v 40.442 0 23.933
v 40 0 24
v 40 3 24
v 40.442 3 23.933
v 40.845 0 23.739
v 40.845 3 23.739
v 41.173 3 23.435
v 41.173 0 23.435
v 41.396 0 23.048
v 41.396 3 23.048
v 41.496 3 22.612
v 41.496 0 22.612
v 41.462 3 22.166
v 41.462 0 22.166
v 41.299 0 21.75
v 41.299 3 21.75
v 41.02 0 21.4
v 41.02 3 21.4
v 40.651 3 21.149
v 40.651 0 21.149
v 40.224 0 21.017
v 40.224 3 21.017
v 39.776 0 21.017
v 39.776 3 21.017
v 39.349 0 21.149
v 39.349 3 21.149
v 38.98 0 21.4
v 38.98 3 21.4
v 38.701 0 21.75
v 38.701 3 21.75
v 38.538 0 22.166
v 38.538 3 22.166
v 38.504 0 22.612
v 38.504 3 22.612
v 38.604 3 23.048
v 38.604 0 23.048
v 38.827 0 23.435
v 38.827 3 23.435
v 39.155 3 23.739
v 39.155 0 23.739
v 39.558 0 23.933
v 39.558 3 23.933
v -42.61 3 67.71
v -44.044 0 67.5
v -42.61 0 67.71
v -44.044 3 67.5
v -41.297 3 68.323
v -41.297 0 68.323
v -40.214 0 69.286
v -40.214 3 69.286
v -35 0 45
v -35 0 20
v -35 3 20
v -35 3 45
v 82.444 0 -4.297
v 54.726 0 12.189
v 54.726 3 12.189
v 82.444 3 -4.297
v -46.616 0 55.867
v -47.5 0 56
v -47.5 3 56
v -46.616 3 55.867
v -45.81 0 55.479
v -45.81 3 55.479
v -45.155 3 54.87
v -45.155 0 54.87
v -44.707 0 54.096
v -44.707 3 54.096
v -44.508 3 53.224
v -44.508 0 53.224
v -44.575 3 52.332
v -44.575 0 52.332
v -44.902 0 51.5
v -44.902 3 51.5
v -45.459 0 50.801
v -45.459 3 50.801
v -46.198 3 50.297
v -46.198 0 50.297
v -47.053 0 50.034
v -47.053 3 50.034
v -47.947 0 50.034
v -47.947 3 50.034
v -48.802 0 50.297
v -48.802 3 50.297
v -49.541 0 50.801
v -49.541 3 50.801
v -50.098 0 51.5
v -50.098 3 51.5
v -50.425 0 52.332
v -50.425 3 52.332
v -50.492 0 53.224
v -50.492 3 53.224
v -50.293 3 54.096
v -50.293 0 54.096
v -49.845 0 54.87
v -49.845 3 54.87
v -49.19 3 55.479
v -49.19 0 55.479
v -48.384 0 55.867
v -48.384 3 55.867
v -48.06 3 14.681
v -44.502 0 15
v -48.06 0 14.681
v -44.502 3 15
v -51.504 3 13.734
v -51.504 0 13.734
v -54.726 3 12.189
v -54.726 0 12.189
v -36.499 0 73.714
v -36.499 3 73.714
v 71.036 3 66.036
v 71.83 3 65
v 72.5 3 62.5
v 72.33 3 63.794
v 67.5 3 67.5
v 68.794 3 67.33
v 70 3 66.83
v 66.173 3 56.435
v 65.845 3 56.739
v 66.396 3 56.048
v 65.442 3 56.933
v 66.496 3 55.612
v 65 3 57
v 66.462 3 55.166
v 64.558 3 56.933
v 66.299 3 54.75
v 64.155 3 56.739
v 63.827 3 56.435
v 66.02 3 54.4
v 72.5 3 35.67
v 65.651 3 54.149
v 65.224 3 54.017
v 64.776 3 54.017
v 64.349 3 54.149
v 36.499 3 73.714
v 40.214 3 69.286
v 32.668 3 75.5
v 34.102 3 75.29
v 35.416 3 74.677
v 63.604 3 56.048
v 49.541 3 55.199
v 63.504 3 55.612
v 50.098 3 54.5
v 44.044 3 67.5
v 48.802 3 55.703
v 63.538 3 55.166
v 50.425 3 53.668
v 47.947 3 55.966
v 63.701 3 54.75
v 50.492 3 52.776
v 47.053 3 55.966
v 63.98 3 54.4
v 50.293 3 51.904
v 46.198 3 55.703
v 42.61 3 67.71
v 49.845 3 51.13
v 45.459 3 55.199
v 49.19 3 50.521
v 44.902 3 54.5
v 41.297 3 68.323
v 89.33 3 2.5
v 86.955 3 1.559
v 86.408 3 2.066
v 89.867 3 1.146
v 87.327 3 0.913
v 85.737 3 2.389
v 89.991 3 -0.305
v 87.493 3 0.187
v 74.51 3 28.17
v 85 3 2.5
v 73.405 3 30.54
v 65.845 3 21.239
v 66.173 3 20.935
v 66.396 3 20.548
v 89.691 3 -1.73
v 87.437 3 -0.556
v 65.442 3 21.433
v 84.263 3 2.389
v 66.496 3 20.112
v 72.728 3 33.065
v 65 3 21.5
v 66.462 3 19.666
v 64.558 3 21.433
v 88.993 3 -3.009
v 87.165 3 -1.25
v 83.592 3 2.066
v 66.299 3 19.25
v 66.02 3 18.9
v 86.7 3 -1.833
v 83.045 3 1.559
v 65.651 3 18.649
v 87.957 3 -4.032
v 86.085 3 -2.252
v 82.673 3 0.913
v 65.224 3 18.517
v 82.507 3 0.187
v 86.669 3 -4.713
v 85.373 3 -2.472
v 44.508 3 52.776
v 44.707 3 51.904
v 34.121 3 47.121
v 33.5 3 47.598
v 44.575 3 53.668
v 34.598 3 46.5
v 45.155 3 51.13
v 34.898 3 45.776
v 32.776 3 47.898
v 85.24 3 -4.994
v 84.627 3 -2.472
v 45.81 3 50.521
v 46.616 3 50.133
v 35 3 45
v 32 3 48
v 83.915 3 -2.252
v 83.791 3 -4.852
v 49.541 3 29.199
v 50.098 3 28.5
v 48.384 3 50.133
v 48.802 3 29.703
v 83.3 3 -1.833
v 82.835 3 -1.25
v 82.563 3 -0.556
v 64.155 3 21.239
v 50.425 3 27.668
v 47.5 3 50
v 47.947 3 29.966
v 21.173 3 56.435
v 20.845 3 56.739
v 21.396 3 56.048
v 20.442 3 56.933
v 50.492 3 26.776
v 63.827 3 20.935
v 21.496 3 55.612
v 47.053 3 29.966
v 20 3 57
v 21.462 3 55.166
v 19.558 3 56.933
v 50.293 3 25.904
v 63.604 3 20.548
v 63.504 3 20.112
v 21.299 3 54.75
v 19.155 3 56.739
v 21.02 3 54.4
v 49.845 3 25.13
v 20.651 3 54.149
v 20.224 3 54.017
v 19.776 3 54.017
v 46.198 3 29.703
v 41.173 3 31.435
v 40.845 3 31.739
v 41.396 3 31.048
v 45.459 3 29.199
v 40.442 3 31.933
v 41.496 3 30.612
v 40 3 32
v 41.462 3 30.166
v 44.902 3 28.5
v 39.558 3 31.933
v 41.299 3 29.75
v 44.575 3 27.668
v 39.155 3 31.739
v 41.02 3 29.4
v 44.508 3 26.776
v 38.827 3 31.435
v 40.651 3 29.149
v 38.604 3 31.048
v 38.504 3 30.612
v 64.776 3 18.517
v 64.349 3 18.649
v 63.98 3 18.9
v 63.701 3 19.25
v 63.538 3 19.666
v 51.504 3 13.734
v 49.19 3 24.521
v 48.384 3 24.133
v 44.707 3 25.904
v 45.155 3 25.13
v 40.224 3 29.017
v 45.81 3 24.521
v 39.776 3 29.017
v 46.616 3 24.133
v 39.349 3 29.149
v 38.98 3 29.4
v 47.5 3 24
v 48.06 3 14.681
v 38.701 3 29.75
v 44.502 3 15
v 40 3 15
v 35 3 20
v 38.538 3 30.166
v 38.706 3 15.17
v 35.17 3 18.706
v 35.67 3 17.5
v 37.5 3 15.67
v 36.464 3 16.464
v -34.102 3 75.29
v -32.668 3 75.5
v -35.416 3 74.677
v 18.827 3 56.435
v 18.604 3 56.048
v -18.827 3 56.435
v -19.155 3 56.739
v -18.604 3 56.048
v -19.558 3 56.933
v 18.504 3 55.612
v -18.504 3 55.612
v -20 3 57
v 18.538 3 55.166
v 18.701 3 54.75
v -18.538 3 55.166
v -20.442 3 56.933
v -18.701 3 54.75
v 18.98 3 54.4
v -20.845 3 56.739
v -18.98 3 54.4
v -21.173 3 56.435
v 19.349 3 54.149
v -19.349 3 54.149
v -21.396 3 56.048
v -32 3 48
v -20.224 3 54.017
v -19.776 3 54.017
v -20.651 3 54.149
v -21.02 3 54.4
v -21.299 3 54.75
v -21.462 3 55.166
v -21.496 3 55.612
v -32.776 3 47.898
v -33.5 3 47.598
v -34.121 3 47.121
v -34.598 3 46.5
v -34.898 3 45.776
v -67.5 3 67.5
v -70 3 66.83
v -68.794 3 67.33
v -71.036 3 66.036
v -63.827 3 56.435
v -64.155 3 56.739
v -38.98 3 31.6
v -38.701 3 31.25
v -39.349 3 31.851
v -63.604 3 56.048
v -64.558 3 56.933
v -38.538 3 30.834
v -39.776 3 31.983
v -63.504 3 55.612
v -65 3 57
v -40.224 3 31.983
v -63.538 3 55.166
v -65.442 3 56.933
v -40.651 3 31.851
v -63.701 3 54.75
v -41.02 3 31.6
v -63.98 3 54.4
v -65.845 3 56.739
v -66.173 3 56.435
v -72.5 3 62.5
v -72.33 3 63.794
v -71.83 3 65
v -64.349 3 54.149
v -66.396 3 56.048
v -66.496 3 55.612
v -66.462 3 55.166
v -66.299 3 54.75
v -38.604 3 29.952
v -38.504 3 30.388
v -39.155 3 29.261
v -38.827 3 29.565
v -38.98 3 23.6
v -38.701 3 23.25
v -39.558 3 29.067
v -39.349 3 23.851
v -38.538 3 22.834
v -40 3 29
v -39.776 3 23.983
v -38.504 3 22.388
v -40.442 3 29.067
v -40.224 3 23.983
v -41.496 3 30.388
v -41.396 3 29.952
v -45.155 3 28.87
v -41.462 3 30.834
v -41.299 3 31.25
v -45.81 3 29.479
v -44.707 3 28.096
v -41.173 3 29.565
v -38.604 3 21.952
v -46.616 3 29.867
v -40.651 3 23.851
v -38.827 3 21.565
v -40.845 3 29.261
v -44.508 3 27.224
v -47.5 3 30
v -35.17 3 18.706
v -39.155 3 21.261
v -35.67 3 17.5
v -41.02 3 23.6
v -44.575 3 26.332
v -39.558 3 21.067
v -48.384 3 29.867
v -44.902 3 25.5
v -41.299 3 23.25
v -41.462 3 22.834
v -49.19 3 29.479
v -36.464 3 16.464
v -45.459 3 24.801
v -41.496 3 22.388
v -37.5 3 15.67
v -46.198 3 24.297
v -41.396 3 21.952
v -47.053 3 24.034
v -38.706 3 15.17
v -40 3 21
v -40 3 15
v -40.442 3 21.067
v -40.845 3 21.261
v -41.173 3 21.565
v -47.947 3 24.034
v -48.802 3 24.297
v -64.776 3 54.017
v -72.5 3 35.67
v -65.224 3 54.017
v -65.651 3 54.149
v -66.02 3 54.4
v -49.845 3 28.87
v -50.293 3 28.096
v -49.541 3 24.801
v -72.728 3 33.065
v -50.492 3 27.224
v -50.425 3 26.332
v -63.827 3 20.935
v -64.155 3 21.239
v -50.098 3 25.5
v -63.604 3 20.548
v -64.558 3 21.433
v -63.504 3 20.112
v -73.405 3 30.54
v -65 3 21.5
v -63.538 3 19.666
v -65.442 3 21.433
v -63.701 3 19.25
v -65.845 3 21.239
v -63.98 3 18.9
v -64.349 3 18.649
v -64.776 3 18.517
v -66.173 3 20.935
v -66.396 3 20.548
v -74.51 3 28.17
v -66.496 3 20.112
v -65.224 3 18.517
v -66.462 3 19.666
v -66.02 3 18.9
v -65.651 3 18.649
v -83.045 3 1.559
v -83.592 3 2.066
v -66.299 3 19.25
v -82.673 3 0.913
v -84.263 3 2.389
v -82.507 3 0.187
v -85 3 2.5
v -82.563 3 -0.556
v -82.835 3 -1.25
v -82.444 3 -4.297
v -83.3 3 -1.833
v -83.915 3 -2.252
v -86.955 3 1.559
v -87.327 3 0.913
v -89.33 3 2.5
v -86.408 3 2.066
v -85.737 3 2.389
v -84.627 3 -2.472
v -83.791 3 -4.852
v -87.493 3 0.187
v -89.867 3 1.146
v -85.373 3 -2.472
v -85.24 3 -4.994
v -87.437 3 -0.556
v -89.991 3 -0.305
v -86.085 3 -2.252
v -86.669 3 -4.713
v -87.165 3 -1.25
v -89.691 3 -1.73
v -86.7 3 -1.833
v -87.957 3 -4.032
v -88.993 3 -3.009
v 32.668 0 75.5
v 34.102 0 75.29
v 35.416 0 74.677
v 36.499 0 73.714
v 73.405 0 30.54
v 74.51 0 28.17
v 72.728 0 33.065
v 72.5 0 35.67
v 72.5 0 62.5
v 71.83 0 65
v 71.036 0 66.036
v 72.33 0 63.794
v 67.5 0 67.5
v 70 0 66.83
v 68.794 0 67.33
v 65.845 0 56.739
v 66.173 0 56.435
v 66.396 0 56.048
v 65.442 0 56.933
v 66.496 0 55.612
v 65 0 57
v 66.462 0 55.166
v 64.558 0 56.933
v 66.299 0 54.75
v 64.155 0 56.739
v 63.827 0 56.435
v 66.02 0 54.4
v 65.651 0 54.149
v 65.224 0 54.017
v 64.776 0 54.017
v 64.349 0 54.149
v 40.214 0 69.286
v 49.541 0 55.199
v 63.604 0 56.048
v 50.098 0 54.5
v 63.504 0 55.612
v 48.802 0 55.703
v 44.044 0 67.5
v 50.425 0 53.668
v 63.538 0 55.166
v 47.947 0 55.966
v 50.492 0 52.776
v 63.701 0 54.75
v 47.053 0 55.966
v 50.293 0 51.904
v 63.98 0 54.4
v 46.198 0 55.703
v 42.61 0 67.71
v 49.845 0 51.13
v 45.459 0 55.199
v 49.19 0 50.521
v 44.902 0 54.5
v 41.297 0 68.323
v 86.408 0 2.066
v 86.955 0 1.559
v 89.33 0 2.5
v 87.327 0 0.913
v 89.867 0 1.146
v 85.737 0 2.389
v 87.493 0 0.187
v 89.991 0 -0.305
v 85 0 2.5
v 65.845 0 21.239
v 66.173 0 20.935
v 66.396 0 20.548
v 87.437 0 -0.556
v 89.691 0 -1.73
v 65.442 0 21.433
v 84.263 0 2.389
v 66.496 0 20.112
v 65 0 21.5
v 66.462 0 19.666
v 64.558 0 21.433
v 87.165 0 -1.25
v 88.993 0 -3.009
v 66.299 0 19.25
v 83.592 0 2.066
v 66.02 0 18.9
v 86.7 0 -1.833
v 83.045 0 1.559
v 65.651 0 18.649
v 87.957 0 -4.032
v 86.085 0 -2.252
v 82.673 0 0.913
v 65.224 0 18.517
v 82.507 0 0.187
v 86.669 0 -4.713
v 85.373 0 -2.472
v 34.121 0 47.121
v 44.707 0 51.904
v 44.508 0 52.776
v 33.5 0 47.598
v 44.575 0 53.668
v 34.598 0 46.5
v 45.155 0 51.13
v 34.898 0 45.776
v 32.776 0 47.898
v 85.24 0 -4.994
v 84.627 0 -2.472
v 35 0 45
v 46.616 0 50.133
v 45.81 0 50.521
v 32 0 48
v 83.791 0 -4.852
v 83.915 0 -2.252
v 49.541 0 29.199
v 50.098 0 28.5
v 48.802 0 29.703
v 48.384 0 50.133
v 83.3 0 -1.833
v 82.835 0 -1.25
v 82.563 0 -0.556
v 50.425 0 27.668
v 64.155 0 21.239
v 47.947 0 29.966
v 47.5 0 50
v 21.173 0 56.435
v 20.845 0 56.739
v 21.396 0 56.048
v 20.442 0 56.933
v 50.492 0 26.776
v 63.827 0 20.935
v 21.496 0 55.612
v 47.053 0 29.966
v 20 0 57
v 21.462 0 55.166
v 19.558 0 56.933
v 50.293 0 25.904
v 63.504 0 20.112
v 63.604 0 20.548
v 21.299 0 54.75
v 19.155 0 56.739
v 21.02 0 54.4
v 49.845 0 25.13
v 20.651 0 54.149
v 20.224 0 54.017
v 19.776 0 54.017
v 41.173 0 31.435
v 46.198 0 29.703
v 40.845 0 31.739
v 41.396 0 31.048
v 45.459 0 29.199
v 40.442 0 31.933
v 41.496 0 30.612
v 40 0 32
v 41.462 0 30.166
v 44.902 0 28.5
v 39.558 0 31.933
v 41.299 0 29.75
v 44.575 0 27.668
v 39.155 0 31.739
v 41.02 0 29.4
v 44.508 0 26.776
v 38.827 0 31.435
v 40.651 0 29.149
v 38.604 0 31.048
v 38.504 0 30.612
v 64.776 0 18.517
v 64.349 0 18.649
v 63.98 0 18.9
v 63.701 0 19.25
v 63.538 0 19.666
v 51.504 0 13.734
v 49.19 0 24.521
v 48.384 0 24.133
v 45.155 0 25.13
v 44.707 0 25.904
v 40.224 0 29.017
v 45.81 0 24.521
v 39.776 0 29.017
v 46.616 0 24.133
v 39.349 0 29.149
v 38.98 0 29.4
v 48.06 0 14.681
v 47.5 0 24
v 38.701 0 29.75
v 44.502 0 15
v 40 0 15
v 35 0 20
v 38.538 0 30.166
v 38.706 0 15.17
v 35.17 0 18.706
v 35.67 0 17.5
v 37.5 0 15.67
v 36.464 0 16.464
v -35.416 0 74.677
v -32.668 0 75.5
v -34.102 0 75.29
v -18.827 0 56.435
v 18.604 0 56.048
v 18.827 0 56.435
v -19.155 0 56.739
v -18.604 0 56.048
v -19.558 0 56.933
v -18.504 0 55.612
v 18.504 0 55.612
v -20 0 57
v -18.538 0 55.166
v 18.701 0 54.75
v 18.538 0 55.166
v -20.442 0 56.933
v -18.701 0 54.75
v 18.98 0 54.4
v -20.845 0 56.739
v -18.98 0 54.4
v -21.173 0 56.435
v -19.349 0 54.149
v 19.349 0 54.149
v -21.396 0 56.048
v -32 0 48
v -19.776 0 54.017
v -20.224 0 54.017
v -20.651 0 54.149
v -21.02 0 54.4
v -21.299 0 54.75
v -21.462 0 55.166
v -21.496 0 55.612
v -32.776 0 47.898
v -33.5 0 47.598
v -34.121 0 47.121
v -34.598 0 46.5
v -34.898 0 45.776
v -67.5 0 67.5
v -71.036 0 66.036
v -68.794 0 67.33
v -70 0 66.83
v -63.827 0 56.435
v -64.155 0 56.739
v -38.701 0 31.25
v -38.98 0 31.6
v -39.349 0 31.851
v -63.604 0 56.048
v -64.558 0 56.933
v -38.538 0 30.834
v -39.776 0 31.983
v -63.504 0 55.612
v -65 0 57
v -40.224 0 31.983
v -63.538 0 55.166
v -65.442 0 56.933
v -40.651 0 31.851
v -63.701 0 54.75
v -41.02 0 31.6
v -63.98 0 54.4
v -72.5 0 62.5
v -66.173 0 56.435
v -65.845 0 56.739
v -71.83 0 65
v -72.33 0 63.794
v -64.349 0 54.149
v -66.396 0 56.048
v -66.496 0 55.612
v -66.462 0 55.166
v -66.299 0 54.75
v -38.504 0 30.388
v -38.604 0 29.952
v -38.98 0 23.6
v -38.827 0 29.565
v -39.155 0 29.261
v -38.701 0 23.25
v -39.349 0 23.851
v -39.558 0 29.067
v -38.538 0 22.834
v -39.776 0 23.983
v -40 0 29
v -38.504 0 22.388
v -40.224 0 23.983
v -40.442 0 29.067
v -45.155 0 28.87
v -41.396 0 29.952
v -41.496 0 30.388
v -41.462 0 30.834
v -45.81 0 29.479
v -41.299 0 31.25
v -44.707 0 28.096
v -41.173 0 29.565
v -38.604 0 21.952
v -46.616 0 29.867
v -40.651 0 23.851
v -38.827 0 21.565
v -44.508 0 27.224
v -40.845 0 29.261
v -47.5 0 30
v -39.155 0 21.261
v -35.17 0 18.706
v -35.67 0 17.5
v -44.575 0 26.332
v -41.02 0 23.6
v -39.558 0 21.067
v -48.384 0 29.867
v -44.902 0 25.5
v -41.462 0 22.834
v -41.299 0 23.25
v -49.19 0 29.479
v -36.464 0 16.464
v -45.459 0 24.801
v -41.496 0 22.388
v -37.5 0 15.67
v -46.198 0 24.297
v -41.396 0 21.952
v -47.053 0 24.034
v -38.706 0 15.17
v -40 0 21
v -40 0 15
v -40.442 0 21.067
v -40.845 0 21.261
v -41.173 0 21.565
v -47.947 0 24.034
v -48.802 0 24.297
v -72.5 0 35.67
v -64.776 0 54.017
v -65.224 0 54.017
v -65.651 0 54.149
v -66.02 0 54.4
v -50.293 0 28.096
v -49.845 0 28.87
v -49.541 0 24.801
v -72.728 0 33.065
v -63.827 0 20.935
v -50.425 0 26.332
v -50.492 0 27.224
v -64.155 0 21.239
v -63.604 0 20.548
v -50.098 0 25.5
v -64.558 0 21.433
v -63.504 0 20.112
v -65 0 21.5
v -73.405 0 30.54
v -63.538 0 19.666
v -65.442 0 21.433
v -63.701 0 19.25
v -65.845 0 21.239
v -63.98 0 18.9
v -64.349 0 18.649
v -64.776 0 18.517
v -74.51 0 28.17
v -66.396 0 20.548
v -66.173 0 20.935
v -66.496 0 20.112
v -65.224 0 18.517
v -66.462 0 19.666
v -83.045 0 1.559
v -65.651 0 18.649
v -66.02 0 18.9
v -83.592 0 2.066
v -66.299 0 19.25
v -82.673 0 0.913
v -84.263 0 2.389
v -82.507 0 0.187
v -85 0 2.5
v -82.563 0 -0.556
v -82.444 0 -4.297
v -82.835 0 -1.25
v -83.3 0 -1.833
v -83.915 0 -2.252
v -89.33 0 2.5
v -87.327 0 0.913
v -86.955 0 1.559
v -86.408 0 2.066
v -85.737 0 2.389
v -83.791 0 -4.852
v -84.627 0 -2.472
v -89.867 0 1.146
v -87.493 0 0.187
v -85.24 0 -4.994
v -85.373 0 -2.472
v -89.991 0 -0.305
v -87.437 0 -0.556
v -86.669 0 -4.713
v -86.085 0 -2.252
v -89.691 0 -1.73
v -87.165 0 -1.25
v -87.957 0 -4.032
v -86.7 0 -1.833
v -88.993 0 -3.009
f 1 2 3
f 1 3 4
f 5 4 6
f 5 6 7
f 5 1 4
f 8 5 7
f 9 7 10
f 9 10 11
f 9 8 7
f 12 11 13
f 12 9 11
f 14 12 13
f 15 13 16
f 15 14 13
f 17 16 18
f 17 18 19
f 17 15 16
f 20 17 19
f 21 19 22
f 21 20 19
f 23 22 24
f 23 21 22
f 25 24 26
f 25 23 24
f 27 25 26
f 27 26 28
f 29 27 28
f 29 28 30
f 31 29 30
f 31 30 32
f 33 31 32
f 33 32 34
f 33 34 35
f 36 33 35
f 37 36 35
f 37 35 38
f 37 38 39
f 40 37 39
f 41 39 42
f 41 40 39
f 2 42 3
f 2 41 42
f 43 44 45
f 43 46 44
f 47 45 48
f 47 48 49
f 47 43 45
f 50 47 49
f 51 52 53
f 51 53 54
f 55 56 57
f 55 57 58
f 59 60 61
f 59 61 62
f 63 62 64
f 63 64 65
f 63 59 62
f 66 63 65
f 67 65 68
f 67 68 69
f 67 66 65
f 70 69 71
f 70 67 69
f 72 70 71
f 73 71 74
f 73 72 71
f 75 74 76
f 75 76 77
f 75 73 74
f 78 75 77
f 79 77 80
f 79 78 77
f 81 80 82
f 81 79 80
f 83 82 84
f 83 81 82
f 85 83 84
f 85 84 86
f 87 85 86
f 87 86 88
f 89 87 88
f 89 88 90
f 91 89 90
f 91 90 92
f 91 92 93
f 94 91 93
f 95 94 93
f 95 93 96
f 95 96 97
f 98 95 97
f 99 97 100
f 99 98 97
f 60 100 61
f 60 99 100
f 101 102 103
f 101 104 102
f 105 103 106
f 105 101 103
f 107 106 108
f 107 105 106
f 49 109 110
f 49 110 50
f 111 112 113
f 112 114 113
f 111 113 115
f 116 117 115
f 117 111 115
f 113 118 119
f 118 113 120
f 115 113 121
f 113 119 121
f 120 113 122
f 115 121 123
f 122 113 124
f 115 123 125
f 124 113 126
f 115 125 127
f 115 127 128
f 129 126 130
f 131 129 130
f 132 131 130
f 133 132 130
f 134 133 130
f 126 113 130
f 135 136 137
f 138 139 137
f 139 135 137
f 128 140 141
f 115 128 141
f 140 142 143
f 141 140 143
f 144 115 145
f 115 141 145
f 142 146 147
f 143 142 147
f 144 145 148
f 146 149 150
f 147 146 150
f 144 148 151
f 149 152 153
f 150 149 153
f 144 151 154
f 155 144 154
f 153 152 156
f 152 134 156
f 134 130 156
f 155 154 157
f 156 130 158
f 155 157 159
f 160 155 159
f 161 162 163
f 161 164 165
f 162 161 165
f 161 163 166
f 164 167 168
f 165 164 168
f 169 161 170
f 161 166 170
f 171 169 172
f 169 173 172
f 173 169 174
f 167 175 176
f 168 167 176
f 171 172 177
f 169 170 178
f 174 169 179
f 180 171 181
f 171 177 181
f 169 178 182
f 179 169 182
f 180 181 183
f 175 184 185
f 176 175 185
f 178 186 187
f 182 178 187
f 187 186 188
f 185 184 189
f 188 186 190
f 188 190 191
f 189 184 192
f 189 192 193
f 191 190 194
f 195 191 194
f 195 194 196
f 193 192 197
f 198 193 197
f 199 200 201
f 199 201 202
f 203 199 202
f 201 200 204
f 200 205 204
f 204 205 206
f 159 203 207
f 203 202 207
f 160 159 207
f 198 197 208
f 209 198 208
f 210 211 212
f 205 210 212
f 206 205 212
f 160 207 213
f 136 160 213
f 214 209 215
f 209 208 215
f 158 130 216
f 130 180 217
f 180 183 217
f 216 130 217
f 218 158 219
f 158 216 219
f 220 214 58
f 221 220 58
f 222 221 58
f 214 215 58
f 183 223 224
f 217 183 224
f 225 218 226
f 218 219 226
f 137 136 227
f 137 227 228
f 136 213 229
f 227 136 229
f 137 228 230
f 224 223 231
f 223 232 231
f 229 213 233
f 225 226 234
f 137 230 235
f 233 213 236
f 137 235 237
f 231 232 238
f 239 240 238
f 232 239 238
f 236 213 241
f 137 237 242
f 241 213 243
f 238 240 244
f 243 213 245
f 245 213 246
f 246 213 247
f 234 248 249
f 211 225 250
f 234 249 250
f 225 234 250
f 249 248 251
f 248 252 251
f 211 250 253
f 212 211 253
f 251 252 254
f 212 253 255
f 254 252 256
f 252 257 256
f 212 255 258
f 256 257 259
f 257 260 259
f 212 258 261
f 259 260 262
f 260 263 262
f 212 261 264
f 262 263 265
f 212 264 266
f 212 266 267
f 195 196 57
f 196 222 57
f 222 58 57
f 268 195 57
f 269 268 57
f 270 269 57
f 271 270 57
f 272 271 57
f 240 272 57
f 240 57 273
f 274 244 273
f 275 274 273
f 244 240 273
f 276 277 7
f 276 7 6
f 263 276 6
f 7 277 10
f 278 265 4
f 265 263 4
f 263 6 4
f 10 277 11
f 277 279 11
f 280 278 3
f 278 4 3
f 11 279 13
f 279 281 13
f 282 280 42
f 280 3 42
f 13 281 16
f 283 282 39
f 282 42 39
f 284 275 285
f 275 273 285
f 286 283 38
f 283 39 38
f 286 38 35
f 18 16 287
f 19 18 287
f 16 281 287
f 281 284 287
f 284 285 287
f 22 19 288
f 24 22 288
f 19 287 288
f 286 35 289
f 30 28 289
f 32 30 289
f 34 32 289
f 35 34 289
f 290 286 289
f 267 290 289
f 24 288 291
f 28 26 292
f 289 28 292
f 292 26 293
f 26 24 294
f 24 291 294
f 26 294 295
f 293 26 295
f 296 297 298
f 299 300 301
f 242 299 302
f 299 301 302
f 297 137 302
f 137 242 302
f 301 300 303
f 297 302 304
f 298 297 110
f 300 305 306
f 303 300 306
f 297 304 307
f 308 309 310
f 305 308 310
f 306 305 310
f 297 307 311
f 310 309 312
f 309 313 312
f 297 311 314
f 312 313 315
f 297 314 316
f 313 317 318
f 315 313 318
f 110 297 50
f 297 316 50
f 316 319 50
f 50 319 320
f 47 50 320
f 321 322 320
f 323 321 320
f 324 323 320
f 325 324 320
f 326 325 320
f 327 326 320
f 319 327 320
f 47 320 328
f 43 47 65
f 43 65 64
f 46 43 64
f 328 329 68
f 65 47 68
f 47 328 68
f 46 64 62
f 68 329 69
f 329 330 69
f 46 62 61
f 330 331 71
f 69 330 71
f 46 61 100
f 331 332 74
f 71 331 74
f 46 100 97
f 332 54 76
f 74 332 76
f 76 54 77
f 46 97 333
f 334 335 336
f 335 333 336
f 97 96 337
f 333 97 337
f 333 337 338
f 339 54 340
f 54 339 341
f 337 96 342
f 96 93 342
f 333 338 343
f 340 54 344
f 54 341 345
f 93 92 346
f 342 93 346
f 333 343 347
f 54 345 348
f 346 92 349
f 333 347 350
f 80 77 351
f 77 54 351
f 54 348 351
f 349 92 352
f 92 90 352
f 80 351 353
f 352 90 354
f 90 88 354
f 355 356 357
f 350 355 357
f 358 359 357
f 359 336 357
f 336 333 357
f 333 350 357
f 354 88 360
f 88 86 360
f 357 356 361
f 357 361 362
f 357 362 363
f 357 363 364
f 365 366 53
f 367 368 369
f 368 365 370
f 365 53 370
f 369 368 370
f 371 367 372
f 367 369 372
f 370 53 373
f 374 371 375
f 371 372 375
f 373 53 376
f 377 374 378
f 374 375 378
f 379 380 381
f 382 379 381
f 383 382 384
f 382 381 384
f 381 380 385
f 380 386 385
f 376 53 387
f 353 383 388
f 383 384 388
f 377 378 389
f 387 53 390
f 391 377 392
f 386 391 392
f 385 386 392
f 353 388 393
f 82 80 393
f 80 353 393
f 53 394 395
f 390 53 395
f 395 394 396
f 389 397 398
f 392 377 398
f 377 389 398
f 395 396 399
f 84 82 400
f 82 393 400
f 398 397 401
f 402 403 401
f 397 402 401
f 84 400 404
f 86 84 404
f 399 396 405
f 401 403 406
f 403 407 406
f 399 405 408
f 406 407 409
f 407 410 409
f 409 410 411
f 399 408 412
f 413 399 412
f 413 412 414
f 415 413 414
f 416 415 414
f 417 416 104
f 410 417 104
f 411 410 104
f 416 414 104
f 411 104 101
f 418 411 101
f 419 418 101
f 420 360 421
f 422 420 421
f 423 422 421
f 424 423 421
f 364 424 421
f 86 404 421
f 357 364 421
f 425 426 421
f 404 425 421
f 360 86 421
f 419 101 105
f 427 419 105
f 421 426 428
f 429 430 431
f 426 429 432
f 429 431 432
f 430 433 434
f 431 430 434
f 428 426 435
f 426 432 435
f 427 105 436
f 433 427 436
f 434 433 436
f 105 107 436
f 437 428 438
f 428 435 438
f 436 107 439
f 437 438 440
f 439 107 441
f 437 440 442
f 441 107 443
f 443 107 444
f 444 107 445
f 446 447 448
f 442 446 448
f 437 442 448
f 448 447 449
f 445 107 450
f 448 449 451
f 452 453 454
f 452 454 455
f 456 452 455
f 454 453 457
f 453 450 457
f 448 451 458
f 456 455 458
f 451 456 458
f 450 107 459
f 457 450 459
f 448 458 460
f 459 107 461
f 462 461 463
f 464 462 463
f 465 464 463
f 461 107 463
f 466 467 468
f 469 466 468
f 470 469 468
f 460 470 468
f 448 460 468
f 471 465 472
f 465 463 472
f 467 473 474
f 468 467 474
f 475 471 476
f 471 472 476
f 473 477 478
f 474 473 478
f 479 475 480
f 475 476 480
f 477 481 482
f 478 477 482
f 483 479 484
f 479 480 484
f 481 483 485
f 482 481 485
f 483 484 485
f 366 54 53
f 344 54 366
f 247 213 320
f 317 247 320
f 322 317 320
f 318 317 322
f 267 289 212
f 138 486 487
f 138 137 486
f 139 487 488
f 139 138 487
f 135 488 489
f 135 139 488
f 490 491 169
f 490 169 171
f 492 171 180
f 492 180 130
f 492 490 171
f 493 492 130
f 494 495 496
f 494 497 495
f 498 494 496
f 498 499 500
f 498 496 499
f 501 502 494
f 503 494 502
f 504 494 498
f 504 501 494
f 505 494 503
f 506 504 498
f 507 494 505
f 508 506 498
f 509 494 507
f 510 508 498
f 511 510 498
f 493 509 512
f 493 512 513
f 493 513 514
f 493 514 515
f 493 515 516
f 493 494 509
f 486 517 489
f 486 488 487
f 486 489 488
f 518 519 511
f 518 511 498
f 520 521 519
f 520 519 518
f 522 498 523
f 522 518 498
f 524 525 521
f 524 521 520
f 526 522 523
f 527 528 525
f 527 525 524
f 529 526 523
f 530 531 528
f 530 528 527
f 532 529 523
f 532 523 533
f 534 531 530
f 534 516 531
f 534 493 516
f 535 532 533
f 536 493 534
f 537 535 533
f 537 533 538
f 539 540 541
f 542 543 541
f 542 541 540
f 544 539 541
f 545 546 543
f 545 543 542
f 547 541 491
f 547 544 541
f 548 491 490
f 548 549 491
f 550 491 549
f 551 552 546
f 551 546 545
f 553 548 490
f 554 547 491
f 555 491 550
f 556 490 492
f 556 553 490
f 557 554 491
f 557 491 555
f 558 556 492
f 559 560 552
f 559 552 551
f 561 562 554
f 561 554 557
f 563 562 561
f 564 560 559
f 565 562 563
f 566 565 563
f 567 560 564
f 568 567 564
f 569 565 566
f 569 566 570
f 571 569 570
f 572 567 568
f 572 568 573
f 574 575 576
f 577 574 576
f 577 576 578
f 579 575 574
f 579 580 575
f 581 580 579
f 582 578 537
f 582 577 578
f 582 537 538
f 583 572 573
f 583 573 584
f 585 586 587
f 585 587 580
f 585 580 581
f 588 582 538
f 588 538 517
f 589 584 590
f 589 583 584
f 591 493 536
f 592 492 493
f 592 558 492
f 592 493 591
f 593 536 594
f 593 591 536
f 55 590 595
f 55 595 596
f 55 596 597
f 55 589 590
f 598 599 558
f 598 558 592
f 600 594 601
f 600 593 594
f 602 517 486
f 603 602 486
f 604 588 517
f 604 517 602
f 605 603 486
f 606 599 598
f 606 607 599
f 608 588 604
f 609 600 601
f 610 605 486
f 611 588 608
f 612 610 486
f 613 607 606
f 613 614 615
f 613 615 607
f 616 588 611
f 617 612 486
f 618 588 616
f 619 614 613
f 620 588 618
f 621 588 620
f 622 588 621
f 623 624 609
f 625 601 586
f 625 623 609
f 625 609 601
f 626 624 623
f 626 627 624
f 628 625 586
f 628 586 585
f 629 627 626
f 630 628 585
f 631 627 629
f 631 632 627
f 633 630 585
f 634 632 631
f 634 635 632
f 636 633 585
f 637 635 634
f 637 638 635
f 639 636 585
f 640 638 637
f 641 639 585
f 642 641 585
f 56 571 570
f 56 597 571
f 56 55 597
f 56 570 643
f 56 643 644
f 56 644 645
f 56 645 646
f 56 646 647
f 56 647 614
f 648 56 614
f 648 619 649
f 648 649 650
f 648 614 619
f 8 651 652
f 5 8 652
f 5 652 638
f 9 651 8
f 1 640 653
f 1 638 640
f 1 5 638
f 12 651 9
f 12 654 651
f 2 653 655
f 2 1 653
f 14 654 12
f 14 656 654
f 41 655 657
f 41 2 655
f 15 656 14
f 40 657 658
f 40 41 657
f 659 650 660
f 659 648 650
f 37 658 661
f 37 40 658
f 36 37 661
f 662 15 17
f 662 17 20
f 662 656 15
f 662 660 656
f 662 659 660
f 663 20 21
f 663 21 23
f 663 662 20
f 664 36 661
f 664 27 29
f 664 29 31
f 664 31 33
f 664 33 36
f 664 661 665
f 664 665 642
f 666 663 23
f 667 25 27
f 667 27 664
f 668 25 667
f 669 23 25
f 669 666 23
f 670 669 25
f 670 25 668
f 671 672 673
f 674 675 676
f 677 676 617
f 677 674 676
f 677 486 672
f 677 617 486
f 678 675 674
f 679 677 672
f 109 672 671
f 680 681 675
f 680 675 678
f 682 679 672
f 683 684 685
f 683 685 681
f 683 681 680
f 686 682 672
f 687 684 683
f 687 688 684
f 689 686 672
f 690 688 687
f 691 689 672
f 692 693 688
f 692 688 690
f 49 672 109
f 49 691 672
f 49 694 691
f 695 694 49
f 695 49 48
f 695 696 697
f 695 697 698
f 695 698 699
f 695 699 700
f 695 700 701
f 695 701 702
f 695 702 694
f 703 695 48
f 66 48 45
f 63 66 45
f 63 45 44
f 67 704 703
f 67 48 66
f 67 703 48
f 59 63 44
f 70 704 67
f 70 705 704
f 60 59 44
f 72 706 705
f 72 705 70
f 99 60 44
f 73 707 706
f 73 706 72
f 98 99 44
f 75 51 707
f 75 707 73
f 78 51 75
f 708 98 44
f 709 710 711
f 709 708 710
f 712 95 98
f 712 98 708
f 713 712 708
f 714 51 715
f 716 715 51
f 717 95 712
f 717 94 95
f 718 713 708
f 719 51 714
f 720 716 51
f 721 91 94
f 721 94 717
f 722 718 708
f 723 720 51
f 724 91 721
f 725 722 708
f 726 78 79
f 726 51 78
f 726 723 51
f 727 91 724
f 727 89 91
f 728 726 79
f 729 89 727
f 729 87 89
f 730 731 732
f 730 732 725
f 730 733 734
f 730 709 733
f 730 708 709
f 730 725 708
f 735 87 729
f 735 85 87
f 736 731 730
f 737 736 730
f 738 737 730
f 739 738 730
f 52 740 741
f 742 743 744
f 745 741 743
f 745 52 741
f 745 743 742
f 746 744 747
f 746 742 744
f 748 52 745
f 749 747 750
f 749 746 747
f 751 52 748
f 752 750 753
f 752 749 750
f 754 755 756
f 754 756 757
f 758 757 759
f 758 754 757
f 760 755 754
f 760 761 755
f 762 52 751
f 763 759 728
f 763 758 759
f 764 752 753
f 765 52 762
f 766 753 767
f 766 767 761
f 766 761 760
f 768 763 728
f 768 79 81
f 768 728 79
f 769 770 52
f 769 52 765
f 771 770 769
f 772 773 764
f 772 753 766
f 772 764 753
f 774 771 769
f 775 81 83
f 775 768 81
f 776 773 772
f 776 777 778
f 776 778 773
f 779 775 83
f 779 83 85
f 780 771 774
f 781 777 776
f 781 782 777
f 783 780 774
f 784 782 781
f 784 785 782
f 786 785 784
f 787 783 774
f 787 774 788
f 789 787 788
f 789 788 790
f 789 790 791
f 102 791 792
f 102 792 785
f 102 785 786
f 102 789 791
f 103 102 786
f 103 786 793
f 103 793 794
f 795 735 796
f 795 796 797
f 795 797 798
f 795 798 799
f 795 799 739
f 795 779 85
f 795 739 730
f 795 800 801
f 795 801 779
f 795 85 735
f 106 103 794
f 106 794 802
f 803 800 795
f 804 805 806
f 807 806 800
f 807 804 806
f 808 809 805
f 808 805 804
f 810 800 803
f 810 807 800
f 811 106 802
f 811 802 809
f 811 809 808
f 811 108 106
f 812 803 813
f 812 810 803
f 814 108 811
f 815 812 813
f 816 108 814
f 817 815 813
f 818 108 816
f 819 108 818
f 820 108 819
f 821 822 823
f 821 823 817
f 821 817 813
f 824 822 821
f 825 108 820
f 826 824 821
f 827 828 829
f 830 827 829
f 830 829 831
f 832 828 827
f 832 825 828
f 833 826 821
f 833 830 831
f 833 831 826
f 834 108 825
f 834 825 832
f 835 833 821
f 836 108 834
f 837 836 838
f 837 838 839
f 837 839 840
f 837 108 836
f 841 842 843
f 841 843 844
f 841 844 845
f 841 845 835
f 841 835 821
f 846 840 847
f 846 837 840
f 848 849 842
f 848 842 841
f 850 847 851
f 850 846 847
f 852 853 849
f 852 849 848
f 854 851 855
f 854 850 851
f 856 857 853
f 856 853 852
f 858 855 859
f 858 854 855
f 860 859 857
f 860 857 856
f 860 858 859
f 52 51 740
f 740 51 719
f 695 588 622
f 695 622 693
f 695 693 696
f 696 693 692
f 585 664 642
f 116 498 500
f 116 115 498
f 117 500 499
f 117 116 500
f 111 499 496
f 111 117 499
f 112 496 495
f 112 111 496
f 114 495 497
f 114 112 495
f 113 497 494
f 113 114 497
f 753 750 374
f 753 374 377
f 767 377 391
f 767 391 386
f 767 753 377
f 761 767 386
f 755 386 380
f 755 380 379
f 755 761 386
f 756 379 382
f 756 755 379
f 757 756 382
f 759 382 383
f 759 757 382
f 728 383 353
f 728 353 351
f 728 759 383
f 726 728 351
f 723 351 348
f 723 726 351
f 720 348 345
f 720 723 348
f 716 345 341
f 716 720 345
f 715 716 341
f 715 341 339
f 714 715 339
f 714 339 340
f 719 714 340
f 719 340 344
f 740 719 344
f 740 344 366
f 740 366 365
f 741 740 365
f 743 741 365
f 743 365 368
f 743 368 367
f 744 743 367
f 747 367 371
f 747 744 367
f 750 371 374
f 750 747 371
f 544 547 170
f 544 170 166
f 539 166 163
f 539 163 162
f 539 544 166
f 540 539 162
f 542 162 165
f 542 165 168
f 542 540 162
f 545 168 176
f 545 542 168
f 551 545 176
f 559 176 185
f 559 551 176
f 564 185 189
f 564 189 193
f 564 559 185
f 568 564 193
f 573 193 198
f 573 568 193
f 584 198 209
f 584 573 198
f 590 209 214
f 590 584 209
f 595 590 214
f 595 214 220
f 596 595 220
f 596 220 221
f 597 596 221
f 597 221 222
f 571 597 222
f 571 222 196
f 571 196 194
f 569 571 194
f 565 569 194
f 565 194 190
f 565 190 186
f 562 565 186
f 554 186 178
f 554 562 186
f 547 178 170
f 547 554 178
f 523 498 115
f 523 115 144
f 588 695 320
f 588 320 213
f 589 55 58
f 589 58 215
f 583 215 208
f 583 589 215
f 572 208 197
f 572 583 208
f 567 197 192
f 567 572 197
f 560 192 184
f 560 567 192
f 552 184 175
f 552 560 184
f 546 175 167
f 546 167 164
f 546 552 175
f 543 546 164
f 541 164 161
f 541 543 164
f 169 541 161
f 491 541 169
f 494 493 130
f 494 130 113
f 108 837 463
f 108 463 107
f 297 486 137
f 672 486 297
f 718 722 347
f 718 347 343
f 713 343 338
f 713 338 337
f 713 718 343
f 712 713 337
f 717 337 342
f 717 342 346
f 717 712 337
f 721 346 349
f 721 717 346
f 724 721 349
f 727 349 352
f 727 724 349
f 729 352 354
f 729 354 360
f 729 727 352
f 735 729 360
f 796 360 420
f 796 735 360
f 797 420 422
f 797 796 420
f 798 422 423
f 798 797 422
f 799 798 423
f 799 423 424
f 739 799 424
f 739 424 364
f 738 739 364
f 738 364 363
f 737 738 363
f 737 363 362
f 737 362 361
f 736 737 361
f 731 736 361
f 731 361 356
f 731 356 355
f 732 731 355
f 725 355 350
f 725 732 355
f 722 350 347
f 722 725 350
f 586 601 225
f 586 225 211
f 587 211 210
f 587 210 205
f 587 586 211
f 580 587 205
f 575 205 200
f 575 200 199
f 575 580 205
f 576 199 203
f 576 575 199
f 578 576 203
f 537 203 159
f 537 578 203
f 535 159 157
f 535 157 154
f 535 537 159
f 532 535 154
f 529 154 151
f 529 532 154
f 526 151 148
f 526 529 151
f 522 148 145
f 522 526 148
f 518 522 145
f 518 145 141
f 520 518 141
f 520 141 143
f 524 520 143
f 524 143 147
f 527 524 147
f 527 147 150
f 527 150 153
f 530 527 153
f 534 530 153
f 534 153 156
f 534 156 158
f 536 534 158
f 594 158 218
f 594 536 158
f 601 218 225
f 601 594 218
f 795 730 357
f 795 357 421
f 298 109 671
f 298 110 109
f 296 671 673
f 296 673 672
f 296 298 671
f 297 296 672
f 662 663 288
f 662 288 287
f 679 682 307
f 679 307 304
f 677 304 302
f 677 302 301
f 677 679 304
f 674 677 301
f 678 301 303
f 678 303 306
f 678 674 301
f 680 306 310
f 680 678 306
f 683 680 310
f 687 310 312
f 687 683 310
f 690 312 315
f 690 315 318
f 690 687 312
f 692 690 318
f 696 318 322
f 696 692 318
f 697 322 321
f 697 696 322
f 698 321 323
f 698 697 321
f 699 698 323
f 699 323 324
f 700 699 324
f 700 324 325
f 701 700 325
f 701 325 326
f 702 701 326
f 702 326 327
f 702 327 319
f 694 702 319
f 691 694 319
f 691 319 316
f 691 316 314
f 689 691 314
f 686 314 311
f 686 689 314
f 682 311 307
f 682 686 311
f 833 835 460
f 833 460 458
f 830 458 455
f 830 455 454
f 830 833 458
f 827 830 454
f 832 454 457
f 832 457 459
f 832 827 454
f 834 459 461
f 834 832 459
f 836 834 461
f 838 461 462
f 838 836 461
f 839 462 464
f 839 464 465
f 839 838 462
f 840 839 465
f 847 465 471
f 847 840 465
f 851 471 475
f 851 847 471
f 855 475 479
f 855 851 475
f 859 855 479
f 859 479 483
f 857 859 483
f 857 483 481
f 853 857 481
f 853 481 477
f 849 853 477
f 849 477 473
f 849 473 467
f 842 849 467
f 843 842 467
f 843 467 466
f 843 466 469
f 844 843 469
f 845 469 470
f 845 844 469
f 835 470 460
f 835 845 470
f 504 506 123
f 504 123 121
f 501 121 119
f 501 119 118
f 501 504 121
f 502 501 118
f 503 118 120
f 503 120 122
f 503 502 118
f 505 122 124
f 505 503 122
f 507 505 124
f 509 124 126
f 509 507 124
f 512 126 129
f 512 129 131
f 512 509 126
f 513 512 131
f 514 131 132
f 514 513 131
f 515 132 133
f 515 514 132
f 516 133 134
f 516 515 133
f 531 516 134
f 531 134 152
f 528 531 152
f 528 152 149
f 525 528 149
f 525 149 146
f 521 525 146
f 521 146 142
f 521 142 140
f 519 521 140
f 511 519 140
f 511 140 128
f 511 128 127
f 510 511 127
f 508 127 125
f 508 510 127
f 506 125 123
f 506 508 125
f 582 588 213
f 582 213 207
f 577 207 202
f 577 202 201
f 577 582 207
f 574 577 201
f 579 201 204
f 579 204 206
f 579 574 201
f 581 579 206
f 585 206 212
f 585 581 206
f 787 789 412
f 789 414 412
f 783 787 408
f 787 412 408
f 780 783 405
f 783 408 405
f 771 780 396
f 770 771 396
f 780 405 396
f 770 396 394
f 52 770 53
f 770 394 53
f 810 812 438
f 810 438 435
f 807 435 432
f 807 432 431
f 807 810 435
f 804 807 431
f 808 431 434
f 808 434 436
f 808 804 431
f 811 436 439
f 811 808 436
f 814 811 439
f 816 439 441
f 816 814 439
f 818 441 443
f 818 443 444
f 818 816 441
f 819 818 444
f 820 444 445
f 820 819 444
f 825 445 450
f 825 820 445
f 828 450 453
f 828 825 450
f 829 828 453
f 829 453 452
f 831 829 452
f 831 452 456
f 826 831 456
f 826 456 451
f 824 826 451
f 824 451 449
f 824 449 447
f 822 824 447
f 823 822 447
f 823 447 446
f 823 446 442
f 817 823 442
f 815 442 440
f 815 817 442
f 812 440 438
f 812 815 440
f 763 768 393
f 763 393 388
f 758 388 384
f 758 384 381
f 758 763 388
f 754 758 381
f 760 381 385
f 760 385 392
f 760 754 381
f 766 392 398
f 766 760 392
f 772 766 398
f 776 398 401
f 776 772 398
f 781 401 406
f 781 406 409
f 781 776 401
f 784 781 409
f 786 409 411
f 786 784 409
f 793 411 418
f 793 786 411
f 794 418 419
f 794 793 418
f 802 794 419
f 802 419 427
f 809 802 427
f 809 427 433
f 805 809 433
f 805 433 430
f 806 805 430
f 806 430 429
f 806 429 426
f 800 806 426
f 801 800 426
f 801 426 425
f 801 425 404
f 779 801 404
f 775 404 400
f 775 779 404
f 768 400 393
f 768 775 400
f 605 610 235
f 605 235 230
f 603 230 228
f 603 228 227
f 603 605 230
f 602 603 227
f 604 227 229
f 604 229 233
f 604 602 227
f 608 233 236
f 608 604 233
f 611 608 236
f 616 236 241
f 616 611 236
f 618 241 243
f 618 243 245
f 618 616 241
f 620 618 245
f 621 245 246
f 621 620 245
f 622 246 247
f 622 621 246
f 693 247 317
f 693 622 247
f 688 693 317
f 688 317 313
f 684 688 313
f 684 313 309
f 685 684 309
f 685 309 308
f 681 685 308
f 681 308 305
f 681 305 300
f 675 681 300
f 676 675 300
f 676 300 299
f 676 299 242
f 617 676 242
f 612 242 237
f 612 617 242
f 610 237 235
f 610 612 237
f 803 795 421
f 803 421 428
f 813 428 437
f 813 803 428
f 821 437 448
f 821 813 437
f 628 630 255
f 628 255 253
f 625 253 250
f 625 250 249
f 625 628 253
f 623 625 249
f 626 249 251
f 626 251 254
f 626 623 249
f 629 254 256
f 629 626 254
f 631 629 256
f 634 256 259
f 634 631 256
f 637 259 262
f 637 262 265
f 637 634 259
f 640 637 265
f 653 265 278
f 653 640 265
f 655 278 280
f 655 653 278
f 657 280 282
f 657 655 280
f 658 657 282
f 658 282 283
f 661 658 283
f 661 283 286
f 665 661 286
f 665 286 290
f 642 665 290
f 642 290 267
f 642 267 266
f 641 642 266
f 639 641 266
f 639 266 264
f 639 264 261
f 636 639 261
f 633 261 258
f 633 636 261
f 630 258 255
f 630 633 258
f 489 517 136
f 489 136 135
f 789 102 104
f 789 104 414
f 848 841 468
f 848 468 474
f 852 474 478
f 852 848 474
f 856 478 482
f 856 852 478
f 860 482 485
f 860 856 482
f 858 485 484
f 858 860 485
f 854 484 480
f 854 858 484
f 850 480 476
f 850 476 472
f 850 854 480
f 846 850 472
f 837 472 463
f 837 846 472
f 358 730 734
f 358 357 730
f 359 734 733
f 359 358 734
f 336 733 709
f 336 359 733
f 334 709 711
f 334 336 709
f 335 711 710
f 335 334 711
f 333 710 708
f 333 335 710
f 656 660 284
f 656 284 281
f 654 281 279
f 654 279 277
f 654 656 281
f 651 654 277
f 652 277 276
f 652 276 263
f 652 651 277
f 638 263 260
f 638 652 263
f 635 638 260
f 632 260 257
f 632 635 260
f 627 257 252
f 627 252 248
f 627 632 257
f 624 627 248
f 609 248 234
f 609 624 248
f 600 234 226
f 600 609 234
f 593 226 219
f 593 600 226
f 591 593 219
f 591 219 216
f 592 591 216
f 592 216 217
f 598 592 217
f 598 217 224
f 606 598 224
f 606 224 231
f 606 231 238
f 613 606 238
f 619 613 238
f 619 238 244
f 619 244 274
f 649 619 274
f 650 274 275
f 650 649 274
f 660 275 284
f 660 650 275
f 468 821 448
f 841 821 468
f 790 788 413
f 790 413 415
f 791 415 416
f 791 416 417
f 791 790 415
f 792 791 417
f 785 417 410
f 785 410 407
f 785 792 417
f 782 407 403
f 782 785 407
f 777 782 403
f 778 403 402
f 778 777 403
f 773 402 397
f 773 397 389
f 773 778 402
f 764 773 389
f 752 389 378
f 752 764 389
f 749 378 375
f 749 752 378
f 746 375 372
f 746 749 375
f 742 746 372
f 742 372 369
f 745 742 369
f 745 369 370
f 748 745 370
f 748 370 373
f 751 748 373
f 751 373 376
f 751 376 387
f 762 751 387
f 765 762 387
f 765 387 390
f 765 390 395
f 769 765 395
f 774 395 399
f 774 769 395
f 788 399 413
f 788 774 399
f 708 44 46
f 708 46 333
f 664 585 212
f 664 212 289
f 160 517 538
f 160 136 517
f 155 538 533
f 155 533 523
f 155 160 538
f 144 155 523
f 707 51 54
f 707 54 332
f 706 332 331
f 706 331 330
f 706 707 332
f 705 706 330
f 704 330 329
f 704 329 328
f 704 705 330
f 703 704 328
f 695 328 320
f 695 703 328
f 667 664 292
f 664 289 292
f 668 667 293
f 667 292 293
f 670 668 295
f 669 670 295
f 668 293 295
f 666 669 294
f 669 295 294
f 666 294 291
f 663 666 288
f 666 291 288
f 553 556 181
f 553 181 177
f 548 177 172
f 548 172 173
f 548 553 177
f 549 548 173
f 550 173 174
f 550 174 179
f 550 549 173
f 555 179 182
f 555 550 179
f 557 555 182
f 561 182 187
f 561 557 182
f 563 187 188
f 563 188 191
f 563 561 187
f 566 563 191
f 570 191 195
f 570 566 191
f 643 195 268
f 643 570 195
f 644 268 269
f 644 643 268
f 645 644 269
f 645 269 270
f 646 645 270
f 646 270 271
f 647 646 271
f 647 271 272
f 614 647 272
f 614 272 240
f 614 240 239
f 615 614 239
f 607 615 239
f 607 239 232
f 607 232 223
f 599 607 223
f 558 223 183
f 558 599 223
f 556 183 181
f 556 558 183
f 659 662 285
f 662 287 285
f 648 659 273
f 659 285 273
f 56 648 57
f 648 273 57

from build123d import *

# Parameters (mm, degrees)
SKETCH_1_R      = 2.5
SKETCH_1_R_2    = 3
SKETCH_1_R_3    = 1.5
EXTRUDE_1_DEPTH = 3
FILLET_1_R      = 20
FILLET_2_R      = 5


with BuildPart() as part:
    # 草图1 → 凸台-拉伸1 (new body)
    with BuildSketch(Plane(origin=(0, 0, 0), x_dir=(1, 0, 0), z_dir=(0, 1, 0))):
        with BuildLine():
            Line((-35, -15), (-35, -45))
            ThreePointArc((-35, -45), (-34.121320344, -47.121320344), (-32, -48))
            Line((-32, -48), (32, -48))
            ThreePointArc((32, -48), (34.121320344, -47.121320344), (35, -45))
            Line((35, -45), (35, -15))
            Line((35, -15), (50, -15))
            Line((50, -15), (82.444008336, 4.297313883))
            ThreePointArc((82.444008336, 4.297313883), (88.512514494, 3.558404408), (89.330127019, -2.5))
            Line((89.330127019, -2.5), (74.509618943, -28.169872981))
            ThreePointArc((74.509618943, -28.169872981), (73.011112606, -31.787587305), (72.5, -35.669872981))
            Line((72.5, -35.669872981), (72.5, -67.5))
            Line((72.5, -67.5), (41.712797049, -67.5))
            Line((41.712797049, -67.5), (35, -75.5))
            Line((35, -75.5), (-35, -75.5))
            Line((-35, -75.5), (-41.712797049, -67.5))
            Line((-41.712797049, -67.5), (-72.5, -67.5))
            Line((-72.5, -67.5), (-72.5, -35.669872981))
            ThreePointArc((-72.5, -35.669872981), (-73.011112606, -31.787587305), (-74.509618943, -28.169872981))
            Line((-74.509618943, -28.169872981), (-89.330127019, -2.5))
            ThreePointArc((-89.330127019, -2.5), (-88.512514494, 3.558404408), (-82.444008336, 4.297313883))
            Line((-82.444008336, 4.297313883), (-50, -15))
            Line((-50, -15), (-35, -15))
        make_face()
        with Locations(Location((85, 0, 0), (0, 0, 270))):
            Circle(SKETCH_1_R, mode=Mode.SUBTRACT)
        with Locations(Location((-85, 0, 0), (0, 0, 270))):
            Circle(SKETCH_1_R, mode=Mode.SUBTRACT)
        with Locations(Location((47.5, -53, 0), (0, 0, 90))):
            Circle(SKETCH_1_R_2, mode=Mode.SUBTRACT)
        with Locations(Location((-47.5, -53, 0), (0, 0, 270))):
            Circle(SKETCH_1_R_2, mode=Mode.SUBTRACT)
        with Locations(Location((20, -55.5, 0), (0, 0, 270))):
            Circle(SKETCH_1_R_3, mode=Mode.SUBTRACT)
        with Locations(Location((-20, -55.5, 0), (0, 0, 270))):
            Circle(SKETCH_1_R_3, mode=Mode.SUBTRACT)
        with Locations(Location((-65, -55.5, 0), (0, 0, 270))):
            Circle(SKETCH_1_R_3, mode=Mode.SUBTRACT)
        with Locations(Location((65, -55.5, 0), (0, 0, 270))):
            Circle(SKETCH_1_R_3, mode=Mode.SUBTRACT)
        with Locations(Location((65, -20, 0), (0, 0, 270))):
            Circle(SKETCH_1_R_3, mode=Mode.SUBTRACT)
        with Locations(Location((-65, -20, 0), (0, 0, 270))):
            Circle(SKETCH_1_R_3, mode=Mode.SUBTRACT)
        with Locations(Location((40, -22.5, 0), (0, 0, 270))):
            Circle(SKETCH_1_R_3, mode=Mode.SUBTRACT)
        with Locations(Location((40, -30.5, 0), (0, 0, 270))):
            Circle(SKETCH_1_R_3, mode=Mode.SUBTRACT)
        with Locations(Location((-47.5, -27, 0), (0, 0, 270))):
            Circle(SKETCH_1_R_2, mode=Mode.SUBTRACT)
        with Locations(Location((47.5, -27, 0), (0, 0, 90))):
            Circle(SKETCH_1_R_2, mode=Mode.SUBTRACT)
        with Locations(Location((-40, -30.5, 0), (0, 0, 90))):
            Circle(SKETCH_1_R_3, mode=Mode.SUBTRACT)
        with Locations(Location((-40, -22.5, 0), (0, 0, 90))):
            Circle(SKETCH_1_R_3, mode=Mode.SUBTRACT)
    extrude(amount=EXTRUDE_1_DEPTH)

    # 圆角1
    fillet_1_edges = [part.edges().sort_by_distance(p)[0] for p in [
        (50, 1.5, 15),
        (-50, 1.5, 15),
    ]]
    fillet(fillet_1_edges, radius=FILLET_1_R)

    # 圆角2
    fillet_2_edges = [part.edges().sort_by_distance(p)[0] for p in [
        (35, 1.5, 15),
        (72.5, 1.5, 67.5),
        (41.712797049, 1.5, 67.5),
        (35, 1.5, 75.5),
        (-35, 1.5, 75.5),
        (-41.712797049, 1.5, 67.5),
        (-72.5, 1.5, 67.5),
        (-35, 1.5, 15),
    ]]
    fillet(fillet_2_edges, radius=FILLET_2_R)


solid = part.part
